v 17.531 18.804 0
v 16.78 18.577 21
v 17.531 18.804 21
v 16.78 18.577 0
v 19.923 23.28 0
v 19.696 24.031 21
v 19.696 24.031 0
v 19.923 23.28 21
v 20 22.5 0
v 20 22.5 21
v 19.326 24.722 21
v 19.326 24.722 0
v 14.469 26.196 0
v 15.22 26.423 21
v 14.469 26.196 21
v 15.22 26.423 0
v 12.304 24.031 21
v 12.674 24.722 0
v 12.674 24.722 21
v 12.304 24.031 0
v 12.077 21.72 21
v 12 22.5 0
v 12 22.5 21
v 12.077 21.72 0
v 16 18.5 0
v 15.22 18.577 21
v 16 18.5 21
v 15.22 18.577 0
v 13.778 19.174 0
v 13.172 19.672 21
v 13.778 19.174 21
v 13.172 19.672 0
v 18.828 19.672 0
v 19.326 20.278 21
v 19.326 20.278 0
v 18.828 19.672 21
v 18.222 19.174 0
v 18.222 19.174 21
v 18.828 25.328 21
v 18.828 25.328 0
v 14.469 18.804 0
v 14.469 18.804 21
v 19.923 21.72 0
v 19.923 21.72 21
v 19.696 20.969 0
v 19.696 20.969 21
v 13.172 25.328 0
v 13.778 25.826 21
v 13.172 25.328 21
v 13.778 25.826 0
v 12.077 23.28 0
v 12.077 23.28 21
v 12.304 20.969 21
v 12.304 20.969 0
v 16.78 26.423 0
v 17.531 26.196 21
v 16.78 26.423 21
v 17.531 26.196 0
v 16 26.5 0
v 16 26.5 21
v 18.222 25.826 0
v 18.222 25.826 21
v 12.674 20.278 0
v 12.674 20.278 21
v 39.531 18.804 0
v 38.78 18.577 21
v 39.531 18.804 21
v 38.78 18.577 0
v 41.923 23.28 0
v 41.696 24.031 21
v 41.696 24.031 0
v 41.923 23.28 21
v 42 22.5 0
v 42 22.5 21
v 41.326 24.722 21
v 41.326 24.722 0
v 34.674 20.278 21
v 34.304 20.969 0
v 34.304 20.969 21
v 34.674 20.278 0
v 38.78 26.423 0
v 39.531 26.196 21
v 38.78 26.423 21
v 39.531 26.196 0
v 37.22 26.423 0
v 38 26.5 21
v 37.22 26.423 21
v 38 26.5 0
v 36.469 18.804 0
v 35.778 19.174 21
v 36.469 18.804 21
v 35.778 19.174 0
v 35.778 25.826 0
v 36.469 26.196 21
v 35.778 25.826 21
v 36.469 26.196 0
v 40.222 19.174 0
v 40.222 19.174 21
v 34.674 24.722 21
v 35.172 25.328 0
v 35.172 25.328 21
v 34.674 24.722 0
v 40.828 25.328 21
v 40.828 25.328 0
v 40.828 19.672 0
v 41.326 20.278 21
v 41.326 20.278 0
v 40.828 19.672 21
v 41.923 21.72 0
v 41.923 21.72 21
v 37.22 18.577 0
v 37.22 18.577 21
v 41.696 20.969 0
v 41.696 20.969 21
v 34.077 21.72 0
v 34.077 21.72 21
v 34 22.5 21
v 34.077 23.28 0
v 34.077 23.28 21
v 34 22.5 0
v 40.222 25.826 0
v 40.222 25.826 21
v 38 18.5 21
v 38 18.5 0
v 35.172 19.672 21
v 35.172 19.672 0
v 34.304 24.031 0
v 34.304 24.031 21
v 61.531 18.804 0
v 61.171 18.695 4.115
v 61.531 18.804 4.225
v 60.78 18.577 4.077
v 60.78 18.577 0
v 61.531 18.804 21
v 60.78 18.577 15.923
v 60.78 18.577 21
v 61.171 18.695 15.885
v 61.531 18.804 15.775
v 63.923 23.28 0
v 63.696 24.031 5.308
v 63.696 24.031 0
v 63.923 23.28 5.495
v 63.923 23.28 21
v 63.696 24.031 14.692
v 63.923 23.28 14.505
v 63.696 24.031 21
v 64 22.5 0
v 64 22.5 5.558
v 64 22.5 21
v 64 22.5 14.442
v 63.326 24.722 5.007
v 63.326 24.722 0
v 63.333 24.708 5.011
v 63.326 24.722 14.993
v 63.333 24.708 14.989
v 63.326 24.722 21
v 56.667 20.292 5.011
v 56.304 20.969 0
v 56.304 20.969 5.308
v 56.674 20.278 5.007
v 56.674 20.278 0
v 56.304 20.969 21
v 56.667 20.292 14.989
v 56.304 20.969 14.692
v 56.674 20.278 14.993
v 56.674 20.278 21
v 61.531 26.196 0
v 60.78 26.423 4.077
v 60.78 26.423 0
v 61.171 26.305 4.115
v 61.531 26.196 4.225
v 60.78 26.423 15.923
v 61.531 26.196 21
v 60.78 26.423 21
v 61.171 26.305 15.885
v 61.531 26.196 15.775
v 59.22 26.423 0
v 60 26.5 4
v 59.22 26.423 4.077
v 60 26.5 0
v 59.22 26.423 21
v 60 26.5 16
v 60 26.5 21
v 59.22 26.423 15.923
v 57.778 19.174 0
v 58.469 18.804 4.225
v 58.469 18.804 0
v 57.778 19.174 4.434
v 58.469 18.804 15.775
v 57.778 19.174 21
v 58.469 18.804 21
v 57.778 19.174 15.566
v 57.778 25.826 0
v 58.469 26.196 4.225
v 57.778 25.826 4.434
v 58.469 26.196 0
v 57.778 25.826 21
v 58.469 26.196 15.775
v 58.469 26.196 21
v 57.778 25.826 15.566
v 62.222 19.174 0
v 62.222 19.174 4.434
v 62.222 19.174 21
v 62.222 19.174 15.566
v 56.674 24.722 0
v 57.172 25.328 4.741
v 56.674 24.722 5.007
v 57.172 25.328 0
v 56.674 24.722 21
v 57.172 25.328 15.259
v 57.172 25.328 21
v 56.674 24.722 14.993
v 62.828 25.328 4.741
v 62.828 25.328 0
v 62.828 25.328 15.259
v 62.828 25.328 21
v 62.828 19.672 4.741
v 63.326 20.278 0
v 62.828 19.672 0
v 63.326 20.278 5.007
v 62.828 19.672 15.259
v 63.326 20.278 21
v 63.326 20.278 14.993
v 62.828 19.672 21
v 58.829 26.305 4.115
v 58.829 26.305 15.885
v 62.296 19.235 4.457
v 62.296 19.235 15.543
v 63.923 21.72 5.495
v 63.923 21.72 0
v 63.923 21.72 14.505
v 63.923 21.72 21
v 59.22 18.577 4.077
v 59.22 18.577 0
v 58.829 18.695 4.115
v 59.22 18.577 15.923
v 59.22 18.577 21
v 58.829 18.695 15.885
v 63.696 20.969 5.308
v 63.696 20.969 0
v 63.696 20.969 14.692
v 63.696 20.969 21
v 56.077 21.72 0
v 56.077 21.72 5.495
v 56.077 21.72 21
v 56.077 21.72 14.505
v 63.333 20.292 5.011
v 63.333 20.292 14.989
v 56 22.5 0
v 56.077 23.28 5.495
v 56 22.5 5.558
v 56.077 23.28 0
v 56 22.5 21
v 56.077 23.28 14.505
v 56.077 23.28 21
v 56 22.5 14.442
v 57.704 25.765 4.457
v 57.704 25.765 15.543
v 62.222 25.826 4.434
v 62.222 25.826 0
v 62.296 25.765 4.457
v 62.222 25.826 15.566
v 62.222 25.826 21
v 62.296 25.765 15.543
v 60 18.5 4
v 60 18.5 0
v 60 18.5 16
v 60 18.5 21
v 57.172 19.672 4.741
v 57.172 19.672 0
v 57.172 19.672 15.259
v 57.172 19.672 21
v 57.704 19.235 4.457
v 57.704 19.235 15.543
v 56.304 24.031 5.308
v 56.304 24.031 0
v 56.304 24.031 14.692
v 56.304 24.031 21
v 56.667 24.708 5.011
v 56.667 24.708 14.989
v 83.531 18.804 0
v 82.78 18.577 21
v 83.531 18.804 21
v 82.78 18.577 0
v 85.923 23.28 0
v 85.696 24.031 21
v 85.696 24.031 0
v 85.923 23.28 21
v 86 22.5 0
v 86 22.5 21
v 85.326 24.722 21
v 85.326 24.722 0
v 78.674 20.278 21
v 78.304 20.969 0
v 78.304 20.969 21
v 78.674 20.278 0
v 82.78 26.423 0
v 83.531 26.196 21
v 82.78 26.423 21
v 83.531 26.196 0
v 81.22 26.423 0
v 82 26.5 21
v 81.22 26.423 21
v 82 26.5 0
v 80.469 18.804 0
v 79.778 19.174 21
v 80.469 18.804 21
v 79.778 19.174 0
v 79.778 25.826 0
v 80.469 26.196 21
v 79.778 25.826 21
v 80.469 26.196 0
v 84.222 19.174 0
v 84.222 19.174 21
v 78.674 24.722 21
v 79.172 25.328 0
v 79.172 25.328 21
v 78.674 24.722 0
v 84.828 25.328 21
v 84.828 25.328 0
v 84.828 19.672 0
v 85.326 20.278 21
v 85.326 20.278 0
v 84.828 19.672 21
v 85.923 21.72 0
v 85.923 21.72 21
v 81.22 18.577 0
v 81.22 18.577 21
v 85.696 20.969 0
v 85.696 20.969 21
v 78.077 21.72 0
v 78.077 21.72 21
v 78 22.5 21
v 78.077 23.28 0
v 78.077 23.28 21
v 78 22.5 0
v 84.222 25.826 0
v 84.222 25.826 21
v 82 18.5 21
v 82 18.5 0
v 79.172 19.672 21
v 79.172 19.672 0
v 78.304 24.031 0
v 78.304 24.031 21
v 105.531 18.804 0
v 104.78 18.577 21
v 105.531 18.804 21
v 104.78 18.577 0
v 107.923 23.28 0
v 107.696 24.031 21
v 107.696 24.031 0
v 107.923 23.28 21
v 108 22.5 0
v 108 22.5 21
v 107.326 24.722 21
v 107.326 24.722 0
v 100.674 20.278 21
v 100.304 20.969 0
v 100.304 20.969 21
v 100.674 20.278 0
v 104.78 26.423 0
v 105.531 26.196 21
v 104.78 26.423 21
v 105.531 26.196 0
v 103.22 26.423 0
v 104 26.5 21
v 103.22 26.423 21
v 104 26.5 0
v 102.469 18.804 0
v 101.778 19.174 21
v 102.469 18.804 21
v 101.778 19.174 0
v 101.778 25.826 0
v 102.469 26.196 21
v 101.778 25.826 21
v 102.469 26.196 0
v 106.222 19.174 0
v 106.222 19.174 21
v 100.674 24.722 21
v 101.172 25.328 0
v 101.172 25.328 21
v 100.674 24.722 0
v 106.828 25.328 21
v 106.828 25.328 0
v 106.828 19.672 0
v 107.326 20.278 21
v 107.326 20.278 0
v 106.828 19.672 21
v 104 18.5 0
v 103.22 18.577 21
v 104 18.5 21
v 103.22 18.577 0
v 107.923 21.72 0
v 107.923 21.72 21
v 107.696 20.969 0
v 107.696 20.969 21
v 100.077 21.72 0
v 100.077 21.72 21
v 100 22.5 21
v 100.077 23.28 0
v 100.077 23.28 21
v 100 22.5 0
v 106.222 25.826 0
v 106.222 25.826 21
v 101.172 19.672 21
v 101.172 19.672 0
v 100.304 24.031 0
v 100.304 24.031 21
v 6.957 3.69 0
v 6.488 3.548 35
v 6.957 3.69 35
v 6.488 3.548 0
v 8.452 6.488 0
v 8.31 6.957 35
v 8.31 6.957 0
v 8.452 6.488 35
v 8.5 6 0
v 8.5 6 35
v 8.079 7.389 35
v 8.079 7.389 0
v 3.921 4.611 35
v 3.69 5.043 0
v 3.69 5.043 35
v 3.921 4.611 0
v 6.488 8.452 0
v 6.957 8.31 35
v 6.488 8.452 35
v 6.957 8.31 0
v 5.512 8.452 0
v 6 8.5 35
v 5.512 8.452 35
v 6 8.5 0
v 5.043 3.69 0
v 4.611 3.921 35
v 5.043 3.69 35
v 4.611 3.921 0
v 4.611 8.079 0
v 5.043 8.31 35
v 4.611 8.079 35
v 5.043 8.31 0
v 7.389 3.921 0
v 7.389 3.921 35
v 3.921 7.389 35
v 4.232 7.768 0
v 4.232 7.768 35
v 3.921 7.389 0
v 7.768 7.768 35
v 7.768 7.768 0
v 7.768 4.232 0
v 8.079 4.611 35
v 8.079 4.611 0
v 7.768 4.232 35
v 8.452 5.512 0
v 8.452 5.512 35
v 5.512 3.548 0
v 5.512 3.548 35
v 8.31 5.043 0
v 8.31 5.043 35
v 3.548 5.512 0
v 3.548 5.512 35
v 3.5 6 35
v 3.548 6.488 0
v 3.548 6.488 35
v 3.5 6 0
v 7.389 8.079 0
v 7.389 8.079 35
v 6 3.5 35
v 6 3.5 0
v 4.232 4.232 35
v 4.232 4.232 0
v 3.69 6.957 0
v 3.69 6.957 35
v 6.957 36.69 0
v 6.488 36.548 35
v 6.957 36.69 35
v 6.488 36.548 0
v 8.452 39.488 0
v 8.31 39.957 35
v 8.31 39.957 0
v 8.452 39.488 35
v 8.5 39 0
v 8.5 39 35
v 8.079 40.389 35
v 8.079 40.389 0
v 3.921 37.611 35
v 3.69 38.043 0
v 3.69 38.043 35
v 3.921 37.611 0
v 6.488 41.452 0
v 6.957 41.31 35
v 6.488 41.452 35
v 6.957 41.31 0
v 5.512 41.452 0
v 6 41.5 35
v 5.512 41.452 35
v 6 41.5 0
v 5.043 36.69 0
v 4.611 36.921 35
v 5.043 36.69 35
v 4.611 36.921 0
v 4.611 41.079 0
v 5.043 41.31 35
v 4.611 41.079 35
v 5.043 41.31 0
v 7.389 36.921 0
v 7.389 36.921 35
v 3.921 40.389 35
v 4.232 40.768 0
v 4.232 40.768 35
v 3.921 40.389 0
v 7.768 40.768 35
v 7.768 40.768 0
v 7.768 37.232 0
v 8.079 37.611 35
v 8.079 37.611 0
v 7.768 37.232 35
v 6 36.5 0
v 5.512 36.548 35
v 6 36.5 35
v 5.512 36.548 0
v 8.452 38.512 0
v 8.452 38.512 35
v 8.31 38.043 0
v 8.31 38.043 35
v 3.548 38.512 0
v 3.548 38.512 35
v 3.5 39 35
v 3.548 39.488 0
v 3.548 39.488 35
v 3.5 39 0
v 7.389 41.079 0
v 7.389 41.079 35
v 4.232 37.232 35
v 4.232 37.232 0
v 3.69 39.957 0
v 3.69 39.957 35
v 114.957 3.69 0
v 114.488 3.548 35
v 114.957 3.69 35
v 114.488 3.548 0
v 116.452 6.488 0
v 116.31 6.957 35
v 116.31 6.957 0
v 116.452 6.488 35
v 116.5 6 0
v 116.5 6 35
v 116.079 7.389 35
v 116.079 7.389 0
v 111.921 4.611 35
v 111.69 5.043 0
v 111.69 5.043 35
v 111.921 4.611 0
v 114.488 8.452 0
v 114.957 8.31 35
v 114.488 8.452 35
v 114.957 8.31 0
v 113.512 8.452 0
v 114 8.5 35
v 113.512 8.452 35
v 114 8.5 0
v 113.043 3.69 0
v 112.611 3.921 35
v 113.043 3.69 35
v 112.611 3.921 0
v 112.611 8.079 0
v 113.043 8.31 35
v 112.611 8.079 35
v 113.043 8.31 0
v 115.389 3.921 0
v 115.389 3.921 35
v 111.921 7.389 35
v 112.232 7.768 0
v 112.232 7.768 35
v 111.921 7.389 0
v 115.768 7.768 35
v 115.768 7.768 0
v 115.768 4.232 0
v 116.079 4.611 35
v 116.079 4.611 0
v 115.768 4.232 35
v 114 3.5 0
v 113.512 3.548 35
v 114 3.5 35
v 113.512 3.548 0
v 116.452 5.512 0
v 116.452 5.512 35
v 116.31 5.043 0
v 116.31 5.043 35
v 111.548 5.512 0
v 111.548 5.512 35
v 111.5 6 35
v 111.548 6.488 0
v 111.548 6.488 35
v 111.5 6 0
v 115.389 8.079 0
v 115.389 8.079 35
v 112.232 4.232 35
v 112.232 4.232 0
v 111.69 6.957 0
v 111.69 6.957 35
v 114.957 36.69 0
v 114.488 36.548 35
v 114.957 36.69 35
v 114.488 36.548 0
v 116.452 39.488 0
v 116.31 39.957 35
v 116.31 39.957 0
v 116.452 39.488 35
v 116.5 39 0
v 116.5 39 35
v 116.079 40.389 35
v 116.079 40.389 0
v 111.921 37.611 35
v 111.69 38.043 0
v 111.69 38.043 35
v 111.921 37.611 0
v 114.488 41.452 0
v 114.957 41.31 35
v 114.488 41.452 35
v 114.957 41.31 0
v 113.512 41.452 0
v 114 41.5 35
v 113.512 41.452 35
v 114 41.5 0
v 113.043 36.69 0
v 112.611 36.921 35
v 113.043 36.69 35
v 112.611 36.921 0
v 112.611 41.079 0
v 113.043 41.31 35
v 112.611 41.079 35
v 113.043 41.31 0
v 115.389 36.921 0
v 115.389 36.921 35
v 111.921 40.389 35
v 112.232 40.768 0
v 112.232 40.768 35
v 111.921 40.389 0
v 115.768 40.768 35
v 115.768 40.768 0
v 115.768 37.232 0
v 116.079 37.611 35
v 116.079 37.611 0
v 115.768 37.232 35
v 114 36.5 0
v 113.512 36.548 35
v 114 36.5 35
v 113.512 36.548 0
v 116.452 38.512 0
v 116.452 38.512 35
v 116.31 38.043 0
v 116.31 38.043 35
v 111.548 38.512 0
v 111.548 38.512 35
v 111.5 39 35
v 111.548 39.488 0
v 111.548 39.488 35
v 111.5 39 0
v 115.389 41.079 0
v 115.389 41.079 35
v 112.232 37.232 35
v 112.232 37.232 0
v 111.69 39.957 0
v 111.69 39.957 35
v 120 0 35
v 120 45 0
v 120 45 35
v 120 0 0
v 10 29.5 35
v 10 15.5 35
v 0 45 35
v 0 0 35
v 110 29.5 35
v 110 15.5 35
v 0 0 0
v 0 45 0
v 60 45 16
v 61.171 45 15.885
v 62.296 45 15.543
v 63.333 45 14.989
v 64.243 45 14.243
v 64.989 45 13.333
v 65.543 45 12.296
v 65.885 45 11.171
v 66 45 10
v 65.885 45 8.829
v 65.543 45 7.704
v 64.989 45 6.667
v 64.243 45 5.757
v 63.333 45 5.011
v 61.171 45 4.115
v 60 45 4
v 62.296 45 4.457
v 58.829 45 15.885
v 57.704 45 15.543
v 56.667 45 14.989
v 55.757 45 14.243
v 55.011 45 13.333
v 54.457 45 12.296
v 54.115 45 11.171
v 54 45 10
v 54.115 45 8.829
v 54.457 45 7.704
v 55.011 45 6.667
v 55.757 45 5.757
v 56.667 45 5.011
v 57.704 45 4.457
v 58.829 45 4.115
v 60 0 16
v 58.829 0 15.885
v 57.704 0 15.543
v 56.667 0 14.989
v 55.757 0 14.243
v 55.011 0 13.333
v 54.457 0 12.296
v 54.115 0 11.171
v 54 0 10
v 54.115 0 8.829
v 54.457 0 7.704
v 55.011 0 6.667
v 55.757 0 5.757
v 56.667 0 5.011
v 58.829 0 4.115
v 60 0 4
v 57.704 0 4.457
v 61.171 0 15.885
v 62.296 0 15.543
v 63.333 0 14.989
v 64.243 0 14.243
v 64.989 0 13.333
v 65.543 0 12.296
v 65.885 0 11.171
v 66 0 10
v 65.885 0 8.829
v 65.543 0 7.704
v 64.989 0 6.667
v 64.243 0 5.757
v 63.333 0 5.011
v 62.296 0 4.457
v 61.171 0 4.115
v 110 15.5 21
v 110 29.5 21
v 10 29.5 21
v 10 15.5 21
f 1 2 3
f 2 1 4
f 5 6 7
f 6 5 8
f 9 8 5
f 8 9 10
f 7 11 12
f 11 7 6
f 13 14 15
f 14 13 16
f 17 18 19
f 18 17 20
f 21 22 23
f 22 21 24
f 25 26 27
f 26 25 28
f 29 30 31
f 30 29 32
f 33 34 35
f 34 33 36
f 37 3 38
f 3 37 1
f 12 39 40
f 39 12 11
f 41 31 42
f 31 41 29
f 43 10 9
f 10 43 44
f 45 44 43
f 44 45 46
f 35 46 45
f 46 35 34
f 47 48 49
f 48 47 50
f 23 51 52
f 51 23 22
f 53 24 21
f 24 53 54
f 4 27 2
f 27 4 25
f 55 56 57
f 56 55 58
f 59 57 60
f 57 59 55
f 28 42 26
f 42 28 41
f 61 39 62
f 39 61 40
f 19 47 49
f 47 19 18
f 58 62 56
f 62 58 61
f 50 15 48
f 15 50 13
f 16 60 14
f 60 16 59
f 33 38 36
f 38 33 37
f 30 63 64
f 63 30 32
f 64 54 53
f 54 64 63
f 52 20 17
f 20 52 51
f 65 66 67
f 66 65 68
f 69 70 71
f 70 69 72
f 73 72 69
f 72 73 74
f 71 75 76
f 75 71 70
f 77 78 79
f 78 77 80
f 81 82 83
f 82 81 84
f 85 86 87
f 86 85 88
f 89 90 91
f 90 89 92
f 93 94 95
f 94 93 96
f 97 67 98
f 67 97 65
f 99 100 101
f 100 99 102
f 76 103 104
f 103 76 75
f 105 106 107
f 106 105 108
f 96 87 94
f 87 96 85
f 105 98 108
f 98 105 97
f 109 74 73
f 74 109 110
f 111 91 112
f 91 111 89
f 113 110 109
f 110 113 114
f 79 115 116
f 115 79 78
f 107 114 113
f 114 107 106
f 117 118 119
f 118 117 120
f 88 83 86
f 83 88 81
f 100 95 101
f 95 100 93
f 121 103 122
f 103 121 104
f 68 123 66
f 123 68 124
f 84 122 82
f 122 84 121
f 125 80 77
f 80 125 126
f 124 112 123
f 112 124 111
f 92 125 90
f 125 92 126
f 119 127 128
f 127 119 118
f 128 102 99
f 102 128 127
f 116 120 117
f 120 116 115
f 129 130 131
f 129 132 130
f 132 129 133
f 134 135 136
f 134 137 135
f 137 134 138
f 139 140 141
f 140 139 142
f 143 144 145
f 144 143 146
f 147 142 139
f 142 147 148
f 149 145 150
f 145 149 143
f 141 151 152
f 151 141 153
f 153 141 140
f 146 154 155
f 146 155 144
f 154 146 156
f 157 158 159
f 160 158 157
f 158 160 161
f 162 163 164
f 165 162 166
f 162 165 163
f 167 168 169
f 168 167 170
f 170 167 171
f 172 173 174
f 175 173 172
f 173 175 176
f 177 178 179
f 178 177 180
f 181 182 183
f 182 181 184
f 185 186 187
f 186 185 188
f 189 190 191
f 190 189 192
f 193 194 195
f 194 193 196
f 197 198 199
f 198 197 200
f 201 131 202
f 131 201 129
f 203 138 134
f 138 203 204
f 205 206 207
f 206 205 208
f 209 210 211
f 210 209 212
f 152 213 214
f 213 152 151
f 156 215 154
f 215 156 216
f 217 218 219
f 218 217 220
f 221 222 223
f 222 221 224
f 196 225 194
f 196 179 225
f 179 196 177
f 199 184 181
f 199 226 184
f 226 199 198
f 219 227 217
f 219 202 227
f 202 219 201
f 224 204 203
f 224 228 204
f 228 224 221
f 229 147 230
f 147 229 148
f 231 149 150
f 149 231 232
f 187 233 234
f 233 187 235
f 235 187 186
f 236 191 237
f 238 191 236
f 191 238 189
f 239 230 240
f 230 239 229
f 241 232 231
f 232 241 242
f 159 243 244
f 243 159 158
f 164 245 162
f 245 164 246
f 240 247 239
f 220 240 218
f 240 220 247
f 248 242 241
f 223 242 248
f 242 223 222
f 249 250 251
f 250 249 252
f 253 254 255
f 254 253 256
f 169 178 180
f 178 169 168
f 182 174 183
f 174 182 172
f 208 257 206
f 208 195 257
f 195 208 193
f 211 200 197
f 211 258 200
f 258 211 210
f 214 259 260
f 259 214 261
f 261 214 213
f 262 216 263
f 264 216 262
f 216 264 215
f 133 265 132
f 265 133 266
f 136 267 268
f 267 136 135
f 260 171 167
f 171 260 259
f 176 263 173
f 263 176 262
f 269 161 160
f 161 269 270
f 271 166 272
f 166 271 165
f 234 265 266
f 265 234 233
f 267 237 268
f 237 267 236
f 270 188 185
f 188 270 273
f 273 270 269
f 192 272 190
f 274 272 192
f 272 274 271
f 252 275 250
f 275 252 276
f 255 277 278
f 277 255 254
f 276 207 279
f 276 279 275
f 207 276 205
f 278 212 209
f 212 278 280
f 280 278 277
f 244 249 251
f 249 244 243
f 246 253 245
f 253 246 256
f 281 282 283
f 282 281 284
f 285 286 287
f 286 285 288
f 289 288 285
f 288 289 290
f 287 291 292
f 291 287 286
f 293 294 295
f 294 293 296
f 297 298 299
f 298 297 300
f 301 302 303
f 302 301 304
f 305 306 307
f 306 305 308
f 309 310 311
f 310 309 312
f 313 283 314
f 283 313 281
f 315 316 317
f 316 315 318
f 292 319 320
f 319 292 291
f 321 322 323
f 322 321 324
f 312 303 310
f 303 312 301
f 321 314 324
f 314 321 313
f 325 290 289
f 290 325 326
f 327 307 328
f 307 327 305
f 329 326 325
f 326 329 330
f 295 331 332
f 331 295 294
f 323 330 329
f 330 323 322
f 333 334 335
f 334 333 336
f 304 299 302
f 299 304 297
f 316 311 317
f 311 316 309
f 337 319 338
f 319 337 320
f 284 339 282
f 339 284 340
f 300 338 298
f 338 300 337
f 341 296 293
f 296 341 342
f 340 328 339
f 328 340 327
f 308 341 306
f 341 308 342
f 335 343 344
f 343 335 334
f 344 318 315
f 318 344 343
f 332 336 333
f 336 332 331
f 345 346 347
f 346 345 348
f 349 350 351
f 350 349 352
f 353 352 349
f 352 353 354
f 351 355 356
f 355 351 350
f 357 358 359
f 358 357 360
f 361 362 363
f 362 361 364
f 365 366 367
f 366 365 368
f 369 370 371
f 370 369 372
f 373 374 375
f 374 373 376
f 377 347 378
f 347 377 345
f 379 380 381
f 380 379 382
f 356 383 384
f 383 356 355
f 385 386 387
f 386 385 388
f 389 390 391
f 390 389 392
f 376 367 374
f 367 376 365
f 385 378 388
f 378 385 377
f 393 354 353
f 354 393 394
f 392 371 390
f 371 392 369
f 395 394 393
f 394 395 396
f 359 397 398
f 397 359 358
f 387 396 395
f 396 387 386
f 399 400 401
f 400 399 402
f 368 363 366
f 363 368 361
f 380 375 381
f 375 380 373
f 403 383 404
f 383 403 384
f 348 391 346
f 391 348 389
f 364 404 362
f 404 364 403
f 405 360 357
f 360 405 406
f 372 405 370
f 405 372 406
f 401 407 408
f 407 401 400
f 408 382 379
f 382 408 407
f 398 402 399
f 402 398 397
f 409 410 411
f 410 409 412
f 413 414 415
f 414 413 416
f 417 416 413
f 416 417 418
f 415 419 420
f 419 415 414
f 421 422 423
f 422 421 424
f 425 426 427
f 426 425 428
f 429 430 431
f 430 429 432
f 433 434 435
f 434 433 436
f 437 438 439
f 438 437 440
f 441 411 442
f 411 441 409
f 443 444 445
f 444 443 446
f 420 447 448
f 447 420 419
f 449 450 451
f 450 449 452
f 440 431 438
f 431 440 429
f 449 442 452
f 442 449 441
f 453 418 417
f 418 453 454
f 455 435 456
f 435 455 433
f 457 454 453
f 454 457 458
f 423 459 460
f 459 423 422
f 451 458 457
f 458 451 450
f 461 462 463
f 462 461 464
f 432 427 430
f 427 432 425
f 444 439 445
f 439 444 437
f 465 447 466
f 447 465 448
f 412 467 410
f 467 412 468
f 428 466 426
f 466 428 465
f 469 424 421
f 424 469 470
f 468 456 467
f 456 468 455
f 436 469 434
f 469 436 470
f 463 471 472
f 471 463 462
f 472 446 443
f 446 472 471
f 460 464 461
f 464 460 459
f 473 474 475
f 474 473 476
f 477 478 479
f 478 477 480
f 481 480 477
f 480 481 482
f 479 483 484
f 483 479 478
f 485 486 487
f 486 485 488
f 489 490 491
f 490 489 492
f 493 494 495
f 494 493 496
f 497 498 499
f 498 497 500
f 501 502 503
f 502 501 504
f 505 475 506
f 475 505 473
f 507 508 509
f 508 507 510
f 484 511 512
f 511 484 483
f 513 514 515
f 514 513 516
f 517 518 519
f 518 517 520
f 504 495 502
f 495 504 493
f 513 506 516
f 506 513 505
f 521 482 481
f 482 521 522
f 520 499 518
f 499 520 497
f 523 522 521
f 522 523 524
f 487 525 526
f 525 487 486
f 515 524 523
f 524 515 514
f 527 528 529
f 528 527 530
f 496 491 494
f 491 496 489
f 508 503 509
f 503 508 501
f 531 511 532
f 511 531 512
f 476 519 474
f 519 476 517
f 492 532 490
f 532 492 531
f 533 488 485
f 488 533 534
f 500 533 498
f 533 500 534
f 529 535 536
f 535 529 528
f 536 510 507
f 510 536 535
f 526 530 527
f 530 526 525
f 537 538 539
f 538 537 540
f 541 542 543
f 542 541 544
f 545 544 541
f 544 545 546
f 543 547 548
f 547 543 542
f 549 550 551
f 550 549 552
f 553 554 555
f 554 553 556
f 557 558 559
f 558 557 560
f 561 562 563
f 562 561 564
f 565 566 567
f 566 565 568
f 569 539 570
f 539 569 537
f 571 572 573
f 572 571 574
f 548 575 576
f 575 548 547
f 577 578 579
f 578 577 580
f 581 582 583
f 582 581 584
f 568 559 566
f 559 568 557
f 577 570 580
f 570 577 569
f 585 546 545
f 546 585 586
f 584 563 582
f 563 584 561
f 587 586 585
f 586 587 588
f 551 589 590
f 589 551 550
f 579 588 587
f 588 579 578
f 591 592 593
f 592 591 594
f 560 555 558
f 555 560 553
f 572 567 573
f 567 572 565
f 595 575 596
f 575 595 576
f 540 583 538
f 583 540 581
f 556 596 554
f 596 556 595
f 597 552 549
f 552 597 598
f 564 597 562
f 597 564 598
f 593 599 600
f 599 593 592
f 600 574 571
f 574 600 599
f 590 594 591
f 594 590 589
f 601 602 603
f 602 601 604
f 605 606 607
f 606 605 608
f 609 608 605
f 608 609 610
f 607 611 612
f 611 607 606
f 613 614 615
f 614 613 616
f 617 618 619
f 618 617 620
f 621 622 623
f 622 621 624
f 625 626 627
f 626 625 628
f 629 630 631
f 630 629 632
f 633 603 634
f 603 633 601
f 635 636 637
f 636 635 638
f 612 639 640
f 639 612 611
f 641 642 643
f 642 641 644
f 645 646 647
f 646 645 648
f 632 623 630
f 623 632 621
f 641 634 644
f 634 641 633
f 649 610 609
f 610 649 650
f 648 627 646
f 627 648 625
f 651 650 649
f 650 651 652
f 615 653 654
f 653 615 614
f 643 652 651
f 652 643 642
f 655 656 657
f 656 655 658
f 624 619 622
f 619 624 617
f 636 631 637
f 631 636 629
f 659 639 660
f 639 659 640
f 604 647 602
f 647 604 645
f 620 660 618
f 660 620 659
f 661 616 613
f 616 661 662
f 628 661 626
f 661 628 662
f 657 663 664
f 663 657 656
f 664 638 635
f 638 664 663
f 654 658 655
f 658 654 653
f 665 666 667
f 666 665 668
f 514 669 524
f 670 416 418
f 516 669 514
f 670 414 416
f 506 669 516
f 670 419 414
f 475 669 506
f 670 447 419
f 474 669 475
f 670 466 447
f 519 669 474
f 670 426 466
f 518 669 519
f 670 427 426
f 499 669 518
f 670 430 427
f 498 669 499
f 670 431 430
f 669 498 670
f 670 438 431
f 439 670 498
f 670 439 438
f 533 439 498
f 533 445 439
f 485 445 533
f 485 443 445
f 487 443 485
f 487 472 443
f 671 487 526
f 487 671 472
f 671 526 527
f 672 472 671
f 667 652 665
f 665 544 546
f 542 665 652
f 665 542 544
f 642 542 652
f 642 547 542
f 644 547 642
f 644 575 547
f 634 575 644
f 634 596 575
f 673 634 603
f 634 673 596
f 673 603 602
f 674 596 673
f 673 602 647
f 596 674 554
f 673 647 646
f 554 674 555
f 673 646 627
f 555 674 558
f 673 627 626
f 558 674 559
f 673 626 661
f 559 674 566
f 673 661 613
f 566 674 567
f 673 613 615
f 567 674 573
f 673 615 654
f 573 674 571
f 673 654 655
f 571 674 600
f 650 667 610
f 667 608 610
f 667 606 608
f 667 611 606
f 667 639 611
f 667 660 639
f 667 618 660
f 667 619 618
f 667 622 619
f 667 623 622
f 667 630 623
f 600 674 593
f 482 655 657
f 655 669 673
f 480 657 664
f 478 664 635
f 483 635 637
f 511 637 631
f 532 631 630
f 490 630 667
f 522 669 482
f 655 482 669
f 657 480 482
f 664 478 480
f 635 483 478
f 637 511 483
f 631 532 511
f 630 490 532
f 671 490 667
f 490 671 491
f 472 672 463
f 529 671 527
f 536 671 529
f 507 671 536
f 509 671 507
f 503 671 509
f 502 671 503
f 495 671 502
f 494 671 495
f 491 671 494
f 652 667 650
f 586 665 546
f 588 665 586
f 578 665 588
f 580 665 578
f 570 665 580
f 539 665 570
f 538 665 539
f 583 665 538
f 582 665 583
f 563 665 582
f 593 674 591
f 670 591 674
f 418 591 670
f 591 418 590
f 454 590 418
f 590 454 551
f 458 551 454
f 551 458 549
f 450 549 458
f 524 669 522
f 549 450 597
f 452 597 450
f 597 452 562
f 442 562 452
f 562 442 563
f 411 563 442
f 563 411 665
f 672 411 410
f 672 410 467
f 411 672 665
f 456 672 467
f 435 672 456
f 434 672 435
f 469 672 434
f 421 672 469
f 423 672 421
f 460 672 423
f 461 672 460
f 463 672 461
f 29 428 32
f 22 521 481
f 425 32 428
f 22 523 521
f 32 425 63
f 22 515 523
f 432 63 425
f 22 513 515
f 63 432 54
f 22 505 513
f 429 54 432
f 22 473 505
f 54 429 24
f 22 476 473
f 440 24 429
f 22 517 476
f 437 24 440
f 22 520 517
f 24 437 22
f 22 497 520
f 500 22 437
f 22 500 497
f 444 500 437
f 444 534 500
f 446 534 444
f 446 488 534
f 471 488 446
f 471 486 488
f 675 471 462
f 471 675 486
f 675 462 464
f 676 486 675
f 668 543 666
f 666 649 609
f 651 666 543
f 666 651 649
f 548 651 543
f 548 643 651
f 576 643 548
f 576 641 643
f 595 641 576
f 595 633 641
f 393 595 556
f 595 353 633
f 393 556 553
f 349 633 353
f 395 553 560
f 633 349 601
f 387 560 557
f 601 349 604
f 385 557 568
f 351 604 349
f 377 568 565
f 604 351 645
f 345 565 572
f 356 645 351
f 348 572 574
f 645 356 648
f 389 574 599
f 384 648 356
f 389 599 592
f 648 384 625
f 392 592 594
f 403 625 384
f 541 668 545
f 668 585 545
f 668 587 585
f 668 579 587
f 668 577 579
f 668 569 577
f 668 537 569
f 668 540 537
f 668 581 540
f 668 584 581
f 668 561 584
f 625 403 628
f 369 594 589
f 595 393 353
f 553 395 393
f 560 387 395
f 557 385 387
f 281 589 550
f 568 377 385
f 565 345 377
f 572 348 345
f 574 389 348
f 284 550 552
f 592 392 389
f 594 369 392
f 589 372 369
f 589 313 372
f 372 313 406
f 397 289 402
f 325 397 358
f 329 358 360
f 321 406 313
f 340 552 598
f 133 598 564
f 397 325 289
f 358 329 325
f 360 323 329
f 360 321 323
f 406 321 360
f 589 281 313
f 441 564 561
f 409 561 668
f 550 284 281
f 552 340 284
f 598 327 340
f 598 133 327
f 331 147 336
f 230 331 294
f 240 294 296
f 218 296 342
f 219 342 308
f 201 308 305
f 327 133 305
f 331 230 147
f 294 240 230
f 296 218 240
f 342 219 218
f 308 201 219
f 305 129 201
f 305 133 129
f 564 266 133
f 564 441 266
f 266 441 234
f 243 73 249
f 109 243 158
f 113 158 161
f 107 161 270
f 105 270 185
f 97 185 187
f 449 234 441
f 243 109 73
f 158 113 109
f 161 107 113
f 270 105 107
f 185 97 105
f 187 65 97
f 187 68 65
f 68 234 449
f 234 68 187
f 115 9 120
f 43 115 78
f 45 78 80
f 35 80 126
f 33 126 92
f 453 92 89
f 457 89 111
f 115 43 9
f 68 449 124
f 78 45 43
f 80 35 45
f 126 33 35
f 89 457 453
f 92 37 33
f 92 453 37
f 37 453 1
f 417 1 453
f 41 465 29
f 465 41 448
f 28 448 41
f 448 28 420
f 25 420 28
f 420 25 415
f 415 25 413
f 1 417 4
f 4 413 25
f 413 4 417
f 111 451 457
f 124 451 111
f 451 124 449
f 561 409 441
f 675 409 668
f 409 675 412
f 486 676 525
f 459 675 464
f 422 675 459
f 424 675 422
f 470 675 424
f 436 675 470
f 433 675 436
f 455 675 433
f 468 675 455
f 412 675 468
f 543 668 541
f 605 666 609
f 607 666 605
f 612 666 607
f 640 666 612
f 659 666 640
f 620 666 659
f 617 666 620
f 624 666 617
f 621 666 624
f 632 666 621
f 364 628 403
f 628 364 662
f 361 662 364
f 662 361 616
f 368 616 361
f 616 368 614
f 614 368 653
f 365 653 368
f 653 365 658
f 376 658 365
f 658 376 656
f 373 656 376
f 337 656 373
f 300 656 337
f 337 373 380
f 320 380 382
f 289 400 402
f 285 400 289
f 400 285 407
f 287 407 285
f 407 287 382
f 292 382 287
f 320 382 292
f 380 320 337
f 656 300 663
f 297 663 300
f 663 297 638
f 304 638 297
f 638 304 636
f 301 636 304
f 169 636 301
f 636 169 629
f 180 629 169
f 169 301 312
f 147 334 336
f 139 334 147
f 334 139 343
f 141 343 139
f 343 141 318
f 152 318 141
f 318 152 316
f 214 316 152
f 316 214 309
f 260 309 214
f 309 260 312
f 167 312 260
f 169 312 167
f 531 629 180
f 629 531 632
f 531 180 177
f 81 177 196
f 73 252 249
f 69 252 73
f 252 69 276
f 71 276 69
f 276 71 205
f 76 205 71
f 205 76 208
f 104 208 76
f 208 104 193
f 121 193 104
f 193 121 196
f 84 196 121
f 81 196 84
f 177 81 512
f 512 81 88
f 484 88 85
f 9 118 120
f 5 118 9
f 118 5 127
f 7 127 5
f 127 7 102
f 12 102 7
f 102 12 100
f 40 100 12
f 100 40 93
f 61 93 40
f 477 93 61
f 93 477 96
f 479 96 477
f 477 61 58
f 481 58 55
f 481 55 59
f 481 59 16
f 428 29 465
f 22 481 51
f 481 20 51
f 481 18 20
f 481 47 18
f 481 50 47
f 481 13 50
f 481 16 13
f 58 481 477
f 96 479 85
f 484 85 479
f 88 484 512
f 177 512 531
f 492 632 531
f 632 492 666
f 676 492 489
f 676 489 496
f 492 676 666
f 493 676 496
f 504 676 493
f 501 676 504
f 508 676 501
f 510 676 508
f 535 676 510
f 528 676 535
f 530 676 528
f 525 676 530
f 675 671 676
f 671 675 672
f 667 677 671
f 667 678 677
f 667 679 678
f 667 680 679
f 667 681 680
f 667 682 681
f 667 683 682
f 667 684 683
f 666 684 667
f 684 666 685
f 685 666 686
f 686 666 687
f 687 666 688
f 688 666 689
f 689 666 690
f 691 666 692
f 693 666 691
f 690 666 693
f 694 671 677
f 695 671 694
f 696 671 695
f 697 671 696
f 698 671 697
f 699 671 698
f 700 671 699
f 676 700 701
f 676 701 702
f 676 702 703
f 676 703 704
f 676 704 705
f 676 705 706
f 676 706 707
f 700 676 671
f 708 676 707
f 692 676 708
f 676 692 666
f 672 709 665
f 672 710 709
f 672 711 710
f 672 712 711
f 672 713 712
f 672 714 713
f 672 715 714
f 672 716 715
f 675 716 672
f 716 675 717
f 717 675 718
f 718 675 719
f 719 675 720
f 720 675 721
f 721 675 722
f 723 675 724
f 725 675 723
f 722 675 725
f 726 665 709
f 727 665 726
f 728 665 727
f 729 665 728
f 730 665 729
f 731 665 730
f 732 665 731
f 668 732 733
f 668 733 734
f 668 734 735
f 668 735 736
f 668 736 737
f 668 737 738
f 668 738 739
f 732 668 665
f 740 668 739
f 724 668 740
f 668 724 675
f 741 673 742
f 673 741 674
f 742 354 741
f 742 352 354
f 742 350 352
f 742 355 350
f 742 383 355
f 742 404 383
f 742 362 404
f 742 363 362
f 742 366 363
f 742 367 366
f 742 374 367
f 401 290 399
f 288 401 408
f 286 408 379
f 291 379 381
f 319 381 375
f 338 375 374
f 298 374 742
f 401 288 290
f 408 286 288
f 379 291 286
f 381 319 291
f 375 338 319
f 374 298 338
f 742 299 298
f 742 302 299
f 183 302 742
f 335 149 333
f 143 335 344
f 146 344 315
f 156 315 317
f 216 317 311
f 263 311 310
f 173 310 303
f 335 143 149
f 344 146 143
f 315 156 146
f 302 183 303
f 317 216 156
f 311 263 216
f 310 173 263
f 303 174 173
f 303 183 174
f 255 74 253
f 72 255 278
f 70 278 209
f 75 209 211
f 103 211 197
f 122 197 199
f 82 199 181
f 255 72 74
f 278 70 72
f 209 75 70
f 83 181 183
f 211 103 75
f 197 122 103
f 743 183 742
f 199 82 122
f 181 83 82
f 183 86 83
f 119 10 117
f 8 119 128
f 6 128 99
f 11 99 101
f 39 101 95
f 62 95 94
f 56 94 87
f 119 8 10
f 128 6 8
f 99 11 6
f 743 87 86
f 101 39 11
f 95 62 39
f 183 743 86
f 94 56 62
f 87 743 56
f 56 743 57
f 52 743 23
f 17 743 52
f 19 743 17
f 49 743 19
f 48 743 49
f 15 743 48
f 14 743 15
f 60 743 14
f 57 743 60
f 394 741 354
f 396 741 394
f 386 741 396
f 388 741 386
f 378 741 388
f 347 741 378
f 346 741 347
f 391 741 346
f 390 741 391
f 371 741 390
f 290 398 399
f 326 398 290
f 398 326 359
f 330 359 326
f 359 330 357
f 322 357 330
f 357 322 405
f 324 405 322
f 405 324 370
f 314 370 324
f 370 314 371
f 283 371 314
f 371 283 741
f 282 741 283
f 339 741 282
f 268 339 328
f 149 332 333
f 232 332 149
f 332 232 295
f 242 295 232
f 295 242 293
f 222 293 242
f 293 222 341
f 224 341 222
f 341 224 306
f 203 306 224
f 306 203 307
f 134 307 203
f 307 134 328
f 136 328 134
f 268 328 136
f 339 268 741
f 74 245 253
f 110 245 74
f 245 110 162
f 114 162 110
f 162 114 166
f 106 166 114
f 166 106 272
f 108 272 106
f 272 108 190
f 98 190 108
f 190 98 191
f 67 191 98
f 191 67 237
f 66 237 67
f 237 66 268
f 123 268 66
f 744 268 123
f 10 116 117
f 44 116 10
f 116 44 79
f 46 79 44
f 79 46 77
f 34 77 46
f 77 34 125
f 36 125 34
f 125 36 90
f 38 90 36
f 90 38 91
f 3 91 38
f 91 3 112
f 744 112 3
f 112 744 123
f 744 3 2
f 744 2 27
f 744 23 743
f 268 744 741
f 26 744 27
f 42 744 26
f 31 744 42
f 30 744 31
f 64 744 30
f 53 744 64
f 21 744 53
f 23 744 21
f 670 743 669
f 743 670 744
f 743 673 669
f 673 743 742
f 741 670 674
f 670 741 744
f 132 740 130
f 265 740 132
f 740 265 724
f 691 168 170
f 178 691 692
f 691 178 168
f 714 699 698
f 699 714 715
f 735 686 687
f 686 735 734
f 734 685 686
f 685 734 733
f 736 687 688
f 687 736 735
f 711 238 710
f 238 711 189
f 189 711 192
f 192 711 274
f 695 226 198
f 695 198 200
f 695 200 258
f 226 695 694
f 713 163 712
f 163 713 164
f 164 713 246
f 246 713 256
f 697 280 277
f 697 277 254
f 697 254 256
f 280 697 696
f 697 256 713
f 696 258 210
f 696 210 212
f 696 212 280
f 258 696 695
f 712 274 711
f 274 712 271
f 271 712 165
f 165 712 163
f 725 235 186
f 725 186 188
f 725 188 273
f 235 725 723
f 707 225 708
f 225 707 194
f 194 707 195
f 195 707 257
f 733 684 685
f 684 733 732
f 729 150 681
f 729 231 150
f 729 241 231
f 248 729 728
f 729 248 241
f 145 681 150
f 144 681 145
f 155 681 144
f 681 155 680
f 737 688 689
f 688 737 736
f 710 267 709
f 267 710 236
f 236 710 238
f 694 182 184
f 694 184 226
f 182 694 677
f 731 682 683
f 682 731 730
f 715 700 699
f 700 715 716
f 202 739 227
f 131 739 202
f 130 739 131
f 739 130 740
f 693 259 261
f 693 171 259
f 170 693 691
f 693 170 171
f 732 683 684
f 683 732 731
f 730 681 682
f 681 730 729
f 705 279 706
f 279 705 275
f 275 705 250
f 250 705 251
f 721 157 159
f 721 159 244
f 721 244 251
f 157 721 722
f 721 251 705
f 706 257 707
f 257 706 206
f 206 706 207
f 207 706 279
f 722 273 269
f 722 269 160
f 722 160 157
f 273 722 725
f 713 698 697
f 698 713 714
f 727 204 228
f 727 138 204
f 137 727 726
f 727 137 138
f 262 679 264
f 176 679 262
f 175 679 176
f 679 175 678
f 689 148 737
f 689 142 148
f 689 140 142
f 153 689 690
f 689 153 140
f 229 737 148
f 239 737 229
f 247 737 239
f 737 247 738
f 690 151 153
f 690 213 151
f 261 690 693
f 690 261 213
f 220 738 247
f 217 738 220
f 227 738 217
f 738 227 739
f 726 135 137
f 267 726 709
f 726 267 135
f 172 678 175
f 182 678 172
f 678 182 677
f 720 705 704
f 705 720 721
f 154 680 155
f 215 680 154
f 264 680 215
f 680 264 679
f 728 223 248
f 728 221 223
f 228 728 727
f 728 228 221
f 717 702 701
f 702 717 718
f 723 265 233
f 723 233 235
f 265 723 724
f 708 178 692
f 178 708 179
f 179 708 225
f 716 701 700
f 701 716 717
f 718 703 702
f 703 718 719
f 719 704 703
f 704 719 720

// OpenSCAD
$fn = 32;

// ----------------------------------------------------------------------
// Manifold block: side_outlet manifold
// ----------------------------------------------------------------------

// --- parameters (mm) ---
block_l = 120;            // block length, X
block_w = 45;             // block width, Y
block_h = 35;             // block height, Z
port_d = 8;               // port bore diameter
port_pitch = 22;          // port pitch along X
gallery_d = 14;           // top gallery width, Y
gallery_depth = 14;       // gallery pocket depth
wall_p = 10;              // gallery end wall thickness, X
mnt_d = 5;                // mounting hole diameter
mnt_in = 6;               // mounting hole inset from the edges
out_d = 12;               // outlet bore diameter
out_z = 10;               // outlet axis height
fit_tol = 0.1;            // tolerance for press fits, mm
free_tol = 0.5;           // tolerance for clearance fits, mm

n_ports = 5;  // ports in the row
port_x0 = (block_l - (n_ports - 1) * port_pitch) / 2;  // first port X

difference() {
  cube([block_l, block_w, block_h]);
  for (i = [0 : n_ports - 1])
    translate([port_x0 + i * port_pitch, block_w / 2, -1])
      cylinder(h = block_h + 2, d = port_d);
  translate([wall_p, block_w / 2 - gallery_d / 2, block_h - gallery_depth])
    cube([block_l - 2 * wall_p, gallery_d, gallery_depth + 1]);
  for (cx = [mnt_in, block_l - mnt_in])
    for (cy = [mnt_in, block_w - mnt_in])
      translate([cx, cy, -1]) cylinder(h = block_h + 2, d = mnt_d);
  translate([block_l / 2, -1, out_z]) rotate([-90, 0, 0])
    cylinder(h = block_w + 2, d = out_d);
}
